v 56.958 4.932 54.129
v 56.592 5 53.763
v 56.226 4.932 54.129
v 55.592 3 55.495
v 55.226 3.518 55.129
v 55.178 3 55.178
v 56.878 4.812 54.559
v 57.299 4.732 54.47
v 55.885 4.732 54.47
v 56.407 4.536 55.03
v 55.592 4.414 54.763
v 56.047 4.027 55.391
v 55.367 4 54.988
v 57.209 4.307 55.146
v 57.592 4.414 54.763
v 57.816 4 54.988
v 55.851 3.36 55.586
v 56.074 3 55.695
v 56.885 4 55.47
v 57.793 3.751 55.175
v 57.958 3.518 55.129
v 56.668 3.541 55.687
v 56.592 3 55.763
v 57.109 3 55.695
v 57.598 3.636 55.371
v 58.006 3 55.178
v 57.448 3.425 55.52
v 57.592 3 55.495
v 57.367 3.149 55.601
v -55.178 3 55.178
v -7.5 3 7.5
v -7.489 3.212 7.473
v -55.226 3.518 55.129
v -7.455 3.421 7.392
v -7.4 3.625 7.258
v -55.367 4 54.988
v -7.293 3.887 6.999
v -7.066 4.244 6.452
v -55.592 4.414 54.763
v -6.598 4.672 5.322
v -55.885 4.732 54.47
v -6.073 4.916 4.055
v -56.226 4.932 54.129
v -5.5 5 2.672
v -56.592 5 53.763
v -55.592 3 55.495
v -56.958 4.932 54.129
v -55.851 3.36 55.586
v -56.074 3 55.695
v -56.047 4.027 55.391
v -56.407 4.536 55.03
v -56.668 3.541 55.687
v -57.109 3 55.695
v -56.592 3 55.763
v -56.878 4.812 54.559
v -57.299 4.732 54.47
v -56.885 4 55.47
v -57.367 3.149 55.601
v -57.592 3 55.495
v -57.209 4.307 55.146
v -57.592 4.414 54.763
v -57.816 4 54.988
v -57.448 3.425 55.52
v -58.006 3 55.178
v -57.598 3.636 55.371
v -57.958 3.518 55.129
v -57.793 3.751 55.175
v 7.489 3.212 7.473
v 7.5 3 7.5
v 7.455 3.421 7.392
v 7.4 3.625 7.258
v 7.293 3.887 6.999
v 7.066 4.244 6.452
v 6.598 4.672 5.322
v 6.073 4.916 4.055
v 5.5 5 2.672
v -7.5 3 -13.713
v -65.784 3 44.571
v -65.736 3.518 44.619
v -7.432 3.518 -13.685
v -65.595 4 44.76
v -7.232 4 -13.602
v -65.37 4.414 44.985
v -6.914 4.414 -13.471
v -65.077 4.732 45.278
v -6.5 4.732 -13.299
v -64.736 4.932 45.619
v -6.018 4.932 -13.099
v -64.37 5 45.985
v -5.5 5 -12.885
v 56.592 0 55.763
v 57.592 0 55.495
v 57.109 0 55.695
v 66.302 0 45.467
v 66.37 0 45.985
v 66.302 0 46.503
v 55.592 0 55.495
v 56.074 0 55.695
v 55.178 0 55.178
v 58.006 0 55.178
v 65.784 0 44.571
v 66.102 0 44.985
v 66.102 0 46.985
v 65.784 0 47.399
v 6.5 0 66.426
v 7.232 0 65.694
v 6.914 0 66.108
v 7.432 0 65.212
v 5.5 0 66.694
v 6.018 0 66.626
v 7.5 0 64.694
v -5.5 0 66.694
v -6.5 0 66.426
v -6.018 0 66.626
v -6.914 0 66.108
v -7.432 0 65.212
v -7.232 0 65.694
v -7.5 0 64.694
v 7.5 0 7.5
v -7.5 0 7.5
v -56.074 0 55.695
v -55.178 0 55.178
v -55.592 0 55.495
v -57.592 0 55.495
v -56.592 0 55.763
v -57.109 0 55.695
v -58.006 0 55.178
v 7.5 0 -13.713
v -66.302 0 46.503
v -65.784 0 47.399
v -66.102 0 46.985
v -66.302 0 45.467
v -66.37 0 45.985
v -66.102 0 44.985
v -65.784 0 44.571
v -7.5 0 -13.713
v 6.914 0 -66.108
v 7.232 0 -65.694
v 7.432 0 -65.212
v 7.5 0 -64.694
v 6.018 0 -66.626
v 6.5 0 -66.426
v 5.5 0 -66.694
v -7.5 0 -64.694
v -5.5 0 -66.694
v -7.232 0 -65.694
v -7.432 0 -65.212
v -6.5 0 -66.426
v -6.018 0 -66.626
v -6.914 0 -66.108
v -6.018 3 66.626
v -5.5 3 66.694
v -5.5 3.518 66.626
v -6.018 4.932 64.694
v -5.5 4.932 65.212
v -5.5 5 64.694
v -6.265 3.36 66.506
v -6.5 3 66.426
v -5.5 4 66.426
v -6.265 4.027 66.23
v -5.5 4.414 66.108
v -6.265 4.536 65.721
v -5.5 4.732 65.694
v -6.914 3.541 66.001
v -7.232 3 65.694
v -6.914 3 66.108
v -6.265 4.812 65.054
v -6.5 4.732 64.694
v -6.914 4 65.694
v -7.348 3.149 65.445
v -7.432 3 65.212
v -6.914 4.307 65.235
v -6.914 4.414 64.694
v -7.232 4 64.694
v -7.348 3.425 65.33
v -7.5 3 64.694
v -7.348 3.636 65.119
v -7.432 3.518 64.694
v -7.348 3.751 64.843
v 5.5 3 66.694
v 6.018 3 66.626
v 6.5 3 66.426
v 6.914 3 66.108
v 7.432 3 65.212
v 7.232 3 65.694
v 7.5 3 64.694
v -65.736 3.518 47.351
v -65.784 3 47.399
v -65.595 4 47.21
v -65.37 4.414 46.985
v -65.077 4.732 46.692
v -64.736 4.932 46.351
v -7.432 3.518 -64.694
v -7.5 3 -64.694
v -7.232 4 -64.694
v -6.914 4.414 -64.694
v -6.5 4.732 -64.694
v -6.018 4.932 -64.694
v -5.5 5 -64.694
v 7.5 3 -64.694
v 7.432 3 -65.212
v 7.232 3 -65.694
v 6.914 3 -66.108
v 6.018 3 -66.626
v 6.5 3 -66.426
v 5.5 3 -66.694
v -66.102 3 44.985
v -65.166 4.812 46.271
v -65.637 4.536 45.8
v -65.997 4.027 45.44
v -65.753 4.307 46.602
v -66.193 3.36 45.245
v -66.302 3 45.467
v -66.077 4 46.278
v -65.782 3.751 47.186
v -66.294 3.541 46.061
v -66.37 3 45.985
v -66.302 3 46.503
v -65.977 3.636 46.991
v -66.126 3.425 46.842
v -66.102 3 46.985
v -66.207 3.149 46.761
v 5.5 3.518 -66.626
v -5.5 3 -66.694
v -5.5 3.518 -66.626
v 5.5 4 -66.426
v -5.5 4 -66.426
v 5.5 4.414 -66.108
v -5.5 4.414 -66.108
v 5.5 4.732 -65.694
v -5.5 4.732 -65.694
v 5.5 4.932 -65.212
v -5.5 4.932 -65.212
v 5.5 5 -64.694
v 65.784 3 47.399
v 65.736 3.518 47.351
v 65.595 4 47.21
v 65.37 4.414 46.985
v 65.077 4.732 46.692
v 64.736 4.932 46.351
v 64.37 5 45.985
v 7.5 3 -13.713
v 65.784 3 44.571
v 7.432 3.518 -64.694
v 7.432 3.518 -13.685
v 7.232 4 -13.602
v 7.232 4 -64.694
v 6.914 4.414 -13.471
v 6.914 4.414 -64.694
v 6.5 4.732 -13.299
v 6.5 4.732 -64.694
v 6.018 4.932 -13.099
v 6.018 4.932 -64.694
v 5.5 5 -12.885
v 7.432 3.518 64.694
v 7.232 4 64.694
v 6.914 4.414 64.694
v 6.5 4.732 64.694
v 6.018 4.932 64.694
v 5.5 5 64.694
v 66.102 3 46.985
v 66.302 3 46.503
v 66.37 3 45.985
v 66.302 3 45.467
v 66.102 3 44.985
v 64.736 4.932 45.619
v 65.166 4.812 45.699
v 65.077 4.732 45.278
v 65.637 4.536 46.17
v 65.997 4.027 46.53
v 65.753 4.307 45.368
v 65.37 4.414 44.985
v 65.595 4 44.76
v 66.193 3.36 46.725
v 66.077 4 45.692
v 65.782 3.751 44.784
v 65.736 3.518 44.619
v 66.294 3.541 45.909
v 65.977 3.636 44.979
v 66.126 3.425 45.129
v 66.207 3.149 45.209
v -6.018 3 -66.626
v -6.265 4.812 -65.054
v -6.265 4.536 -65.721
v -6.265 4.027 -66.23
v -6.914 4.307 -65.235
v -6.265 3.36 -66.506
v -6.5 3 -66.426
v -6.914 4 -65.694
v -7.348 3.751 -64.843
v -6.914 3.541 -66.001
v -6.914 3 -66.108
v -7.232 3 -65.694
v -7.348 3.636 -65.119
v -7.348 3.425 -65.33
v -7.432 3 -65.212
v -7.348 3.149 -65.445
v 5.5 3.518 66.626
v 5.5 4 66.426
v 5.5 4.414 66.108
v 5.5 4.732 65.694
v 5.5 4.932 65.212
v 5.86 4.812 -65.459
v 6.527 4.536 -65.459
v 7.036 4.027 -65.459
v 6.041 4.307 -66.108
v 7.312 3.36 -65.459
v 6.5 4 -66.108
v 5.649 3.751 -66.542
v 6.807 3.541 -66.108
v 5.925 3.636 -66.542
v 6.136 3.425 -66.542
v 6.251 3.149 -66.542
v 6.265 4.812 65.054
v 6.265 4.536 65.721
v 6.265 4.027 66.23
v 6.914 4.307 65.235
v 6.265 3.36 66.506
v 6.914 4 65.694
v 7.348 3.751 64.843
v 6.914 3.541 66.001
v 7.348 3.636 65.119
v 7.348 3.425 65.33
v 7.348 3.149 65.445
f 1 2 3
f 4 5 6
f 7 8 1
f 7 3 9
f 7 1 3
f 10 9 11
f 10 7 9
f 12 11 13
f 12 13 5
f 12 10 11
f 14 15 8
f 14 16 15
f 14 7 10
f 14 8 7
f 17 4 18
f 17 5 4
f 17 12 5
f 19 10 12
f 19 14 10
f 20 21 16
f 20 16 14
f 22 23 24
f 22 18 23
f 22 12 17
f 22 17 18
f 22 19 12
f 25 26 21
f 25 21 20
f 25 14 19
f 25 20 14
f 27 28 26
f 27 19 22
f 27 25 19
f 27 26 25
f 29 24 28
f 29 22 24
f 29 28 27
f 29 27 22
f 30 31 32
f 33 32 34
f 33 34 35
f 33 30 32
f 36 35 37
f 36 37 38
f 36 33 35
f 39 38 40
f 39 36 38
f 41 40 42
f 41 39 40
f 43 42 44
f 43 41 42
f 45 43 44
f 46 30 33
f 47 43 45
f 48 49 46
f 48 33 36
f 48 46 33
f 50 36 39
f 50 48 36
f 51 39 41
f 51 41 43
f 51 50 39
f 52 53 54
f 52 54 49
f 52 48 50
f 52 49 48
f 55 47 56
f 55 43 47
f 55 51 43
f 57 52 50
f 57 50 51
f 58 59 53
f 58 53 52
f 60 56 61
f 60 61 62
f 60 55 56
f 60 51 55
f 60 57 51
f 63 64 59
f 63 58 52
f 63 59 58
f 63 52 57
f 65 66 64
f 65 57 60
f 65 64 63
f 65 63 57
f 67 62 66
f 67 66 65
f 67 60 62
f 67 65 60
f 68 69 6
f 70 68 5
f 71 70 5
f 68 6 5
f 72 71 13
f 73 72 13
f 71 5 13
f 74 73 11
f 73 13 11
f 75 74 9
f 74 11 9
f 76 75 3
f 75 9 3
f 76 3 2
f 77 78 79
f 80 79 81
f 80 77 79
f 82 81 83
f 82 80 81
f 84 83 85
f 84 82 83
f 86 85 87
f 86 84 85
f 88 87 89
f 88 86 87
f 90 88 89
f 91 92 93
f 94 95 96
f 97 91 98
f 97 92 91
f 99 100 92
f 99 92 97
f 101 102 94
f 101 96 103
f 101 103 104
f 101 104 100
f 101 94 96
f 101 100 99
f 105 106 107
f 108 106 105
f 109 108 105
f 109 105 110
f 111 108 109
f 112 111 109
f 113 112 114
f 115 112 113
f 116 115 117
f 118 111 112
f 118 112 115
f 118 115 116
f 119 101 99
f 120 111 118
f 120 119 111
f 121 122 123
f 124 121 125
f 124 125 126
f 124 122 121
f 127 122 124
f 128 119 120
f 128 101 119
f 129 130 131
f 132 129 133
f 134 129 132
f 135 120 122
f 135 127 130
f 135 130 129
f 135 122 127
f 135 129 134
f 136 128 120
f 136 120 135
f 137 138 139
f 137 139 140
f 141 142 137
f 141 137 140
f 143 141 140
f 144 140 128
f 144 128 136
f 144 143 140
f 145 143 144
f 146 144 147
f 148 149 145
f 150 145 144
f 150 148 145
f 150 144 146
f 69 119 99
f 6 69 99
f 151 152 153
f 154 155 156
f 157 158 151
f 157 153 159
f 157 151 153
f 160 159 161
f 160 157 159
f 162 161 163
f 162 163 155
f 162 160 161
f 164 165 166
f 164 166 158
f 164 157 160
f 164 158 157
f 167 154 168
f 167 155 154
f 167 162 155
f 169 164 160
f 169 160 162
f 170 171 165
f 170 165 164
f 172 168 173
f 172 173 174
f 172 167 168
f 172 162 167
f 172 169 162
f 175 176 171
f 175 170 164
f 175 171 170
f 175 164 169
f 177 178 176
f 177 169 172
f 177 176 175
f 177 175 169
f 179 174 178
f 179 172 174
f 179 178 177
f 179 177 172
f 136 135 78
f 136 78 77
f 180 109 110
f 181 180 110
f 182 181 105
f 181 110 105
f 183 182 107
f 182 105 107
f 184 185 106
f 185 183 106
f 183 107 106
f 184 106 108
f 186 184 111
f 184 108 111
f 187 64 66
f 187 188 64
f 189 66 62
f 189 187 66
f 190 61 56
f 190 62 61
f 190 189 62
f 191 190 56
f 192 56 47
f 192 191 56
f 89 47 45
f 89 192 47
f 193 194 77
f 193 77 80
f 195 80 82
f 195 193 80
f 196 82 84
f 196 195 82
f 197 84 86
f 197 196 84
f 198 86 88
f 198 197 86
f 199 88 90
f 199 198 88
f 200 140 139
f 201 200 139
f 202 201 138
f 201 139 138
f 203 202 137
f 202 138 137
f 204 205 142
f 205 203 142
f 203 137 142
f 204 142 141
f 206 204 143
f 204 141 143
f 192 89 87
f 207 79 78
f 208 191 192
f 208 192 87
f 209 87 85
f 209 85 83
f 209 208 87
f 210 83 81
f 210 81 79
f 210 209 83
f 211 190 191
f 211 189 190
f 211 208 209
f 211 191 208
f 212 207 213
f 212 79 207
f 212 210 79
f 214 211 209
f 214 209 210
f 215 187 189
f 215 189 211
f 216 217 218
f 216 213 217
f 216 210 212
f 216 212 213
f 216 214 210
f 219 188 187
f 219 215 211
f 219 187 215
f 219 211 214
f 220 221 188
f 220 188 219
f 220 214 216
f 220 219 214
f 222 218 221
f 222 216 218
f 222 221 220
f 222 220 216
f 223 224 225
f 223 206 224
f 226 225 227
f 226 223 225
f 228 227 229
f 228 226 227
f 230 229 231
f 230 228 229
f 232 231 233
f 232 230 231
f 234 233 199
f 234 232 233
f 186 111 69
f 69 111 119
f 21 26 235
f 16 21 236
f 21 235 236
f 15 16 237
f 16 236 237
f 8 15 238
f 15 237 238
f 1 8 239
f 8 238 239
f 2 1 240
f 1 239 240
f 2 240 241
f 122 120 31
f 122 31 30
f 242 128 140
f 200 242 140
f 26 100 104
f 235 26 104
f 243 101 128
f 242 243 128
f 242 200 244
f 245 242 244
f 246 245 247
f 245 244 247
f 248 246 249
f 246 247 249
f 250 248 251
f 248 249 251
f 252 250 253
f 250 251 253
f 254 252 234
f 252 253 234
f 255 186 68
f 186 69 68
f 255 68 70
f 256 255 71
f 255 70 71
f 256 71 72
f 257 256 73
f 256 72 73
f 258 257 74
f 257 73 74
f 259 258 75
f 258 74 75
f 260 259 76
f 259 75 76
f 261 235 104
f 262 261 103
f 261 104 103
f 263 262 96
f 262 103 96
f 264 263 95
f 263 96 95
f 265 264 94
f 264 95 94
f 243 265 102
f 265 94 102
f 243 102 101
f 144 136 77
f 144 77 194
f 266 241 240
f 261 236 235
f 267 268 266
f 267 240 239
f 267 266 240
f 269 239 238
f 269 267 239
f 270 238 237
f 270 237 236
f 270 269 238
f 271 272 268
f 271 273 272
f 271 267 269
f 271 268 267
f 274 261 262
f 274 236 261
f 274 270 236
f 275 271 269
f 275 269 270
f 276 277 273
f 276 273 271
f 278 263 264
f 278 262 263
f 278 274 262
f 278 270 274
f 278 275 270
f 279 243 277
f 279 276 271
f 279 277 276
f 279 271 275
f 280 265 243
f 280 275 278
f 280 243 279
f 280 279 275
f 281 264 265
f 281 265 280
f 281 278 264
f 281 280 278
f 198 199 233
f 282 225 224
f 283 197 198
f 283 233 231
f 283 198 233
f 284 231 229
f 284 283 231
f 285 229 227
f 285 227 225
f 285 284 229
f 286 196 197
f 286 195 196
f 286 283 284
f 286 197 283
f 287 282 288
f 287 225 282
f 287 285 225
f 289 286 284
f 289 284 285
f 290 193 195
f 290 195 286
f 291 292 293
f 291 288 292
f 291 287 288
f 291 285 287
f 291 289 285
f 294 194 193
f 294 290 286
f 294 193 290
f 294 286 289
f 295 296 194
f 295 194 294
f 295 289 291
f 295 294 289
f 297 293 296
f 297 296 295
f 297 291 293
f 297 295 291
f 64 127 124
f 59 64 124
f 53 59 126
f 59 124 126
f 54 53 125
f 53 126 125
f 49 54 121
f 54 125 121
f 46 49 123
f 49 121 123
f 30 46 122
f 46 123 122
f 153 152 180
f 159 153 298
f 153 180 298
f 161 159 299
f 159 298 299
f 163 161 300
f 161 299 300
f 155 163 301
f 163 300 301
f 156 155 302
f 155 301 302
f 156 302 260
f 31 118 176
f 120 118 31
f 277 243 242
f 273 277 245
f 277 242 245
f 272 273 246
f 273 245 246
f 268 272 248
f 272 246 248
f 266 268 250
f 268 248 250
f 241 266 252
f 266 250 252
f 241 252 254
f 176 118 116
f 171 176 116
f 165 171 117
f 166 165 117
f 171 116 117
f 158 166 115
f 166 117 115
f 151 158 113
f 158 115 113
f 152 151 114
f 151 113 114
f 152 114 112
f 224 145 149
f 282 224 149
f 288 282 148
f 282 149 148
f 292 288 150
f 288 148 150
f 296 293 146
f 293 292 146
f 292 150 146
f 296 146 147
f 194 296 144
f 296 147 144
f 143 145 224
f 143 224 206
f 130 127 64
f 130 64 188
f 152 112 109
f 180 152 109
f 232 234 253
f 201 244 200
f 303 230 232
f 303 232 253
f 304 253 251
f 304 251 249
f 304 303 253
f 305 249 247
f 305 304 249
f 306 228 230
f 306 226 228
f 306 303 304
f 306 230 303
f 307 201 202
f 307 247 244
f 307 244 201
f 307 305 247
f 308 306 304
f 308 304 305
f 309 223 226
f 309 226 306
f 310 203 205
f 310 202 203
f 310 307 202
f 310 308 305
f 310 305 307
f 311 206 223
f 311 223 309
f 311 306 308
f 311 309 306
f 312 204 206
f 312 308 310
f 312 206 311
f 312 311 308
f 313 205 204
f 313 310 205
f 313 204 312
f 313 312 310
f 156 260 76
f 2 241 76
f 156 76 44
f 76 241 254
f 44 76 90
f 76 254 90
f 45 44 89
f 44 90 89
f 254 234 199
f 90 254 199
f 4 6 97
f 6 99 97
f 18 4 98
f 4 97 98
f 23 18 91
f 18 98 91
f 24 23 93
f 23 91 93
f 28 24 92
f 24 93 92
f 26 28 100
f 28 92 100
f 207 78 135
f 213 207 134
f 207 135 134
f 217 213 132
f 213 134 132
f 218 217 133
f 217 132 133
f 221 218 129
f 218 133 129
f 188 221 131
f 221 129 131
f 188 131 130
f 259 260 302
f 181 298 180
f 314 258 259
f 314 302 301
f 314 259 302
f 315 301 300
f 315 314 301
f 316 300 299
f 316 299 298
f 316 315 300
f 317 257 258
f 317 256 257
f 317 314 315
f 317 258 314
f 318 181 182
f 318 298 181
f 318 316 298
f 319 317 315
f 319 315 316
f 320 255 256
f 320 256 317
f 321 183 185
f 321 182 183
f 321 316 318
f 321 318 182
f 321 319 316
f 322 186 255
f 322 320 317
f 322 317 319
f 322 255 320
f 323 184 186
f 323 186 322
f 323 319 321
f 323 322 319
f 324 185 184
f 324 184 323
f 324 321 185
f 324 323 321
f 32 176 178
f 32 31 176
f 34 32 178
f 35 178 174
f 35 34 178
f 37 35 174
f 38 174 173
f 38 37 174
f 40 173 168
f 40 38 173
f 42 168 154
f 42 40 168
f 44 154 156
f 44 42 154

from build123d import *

# Parameters (mm, degrees)
SKETCH1_W           = 15
SKETCH1_H           = 133.387974866
BOSS_EXTRUDE4_DEPTH = 5
FILLET2_R           = 2
FILLET3_R           = 2


with BuildPart() as part:
    # Sketch1 → Boss-Extrude4 (new body)
    with BuildSketch(Plane(origin=(0, 0, 0), x_dir=(1, 0, 0), z_dir=(0, 1, 0))):
        Polygon((-56.591724934, -56.591724934), (-67.198326652, -45.985123216), (-4.122226718, 17.090976718), (6.484375, 6.484375), align=None)
        Rectangle(SKETCH1_W, SKETCH1_H)
        Polygon((56.591724934, -56.591724934), (67.198326652, -45.985123216), (3.579374214, 17.633829222), (-7.027227504, 7.027227504), align=None)
    extrude(amount=BOSS_EXTRUDE4_DEPTH)

    # Fillet2
    fillet2_edges = [part.edges().sort_by_distance(p)[0] for p in [
        (32.045862467, 5, 32.045862467),
        (-32.045862467, 5, 32.045862467),
        (-61.895025793, 5, 51.288424075),
        (-37.349163326, 5, 16.13595989),
        (-7.5, 5, 37.096993717),
        (-7.5, 5, -40.203595434),
        (0, 5, 66.693987433),
        (7.5, 5, 37.096993717),
        (7.5, 5, -40.203595434),
        (0, 5, -66.693987433),
        (61.895025793, 5, 51.288424075),
        (37.349163326, 5, 16.13595989),
    ]]
    fillet(fillet2_edges, radius=FILLET2_R)

    # Fillet3
    # the kernel refuses this fillet: 2 mm, written as the material it takes off along each edge
    with BuildSketch(Plane(origin=(-5.5, 3, 64.693987433), x_dir=(0, 0, 1), z_dir=(-1, 0, 0))) as fillet3_piece_1_section:
        Polygon((0, 0), (FILLET3_R, 0), (FILLET3_R, FILLET3_R), (0, FILLET3_R), align=None)
    fillet3_piece_1 = extrude(amount=FILLET3_R, mode=Mode.PRIVATE)
    fillet3_piece_1 = fillet3_piece_1 - Plane(origin=(-5.5, 3, 64.693987433), x_dir=(0, -0.7071067811865475, -0.7071067811865475), z_dir=(-1, 0, 0)) * Sphere(FILLET3_R, mode=Mode.PRIVATE)
    add(fillet3_piece_1, mode=Mode.SUBTRACT)
    with BuildSketch(Plane(origin=(5.5, 3, 64.693987433), x_dir=(0, 0, 1), z_dir=(1, 0, 0))) as fillet3_piece_2_section:
        Polygon((0, 0), (FILLET3_R, 0), (FILLET3_R, -FILLET3_R), (0, -FILLET3_R), align=None)
    fillet3_piece_2 = extrude(amount=FILLET3_R, mode=Mode.PRIVATE)
    fillet3_piece_2 = fillet3_piece_2 - Plane(origin=(5.5, 3, 64.693987433), x_dir=(0, -0.7071067811865475, -0.7071067811865475), z_dir=(1, 0, 0)) * Sphere(FILLET3_R, mode=Mode.PRIVATE)
    add(fillet3_piece_2, mode=Mode.SUBTRACT)
    with BuildSketch(Plane(origin=(-56.591724934, 3, 53.763297809), x_dir=(0.7071067811865437, 0, 0.7071067811865513), z_dir=(-0.7071067811865476, 0, 0.7071067811865476))) as fillet3_piece_3_section:
        Polygon((0, 0), (FILLET3_R, 0), (FILLET3_R, FILLET3_R), (0, FILLET3_R), align=None)
    fillet3_piece_3 = extrude(amount=FILLET3_R, mode=Mode.PRIVATE)
    fillet3_piece_3 = fillet3_piece_3 - Plane(origin=(-56.591724934, 3, 53.763297809), x_dir=(-0.4999999999999973, -0.7071067811865475, -0.5000000000000027), z_dir=(-0.7071067811865476, 0, 0.7071067811865476)) * Sphere(FILLET3_R, mode=Mode.PRIVATE)
    add(fillet3_piece_3, mode=Mode.SUBTRACT)
    with BuildSketch(Plane(origin=(56.591724934, 3, 53.763297809), x_dir=(-0.7071067811865476, 0, 0.7071067811865476), z_dir=(0.7071067811865479, 0, 0.7071067811865474))) as fillet3_piece_4_section:
        Polygon((0, 0), (FILLET3_R, 0), (FILLET3_R, -FILLET3_R), (0, -FILLET3_R), align=None)
    fillet3_piece_4 = extrude(amount=FILLET3_R, mode=Mode.PRIVATE)
    fillet3_piece_4 = fillet3_piece_4 - Plane(origin=(56.591724934, 3, 53.763297809), x_dir=(0.5, -0.7071067811865475, -0.5), z_dir=(0.7071067811865479, 0, 0.7071067811865474)) * Sphere(FILLET3_R, mode=Mode.PRIVATE)
    add(fillet3_piece_4, mode=Mode.SUBTRACT)
    with BuildSketch(Plane(origin=(-64.369899527, 3, 45.985123216), x_dir=(-0.7071067811865476, 0, -0.7071067811865476), z_dir=(-0.7071067811865476, 0, 0.7071067811865476))) as fillet3_piece_5_section:
        Polygon((0, 0), (FILLET3_R, 0), (FILLET3_R, -FILLET3_R), (0, -FILLET3_R), align=None)
    fillet3_piece_5 = extrude(amount=FILLET3_R, mode=Mode.PRIVATE)
    fillet3_piece_5 = fillet3_piece_5 - Plane(origin=(-64.369899527, 3, 45.985123216), x_dir=(0.5, -0.7071067811865475, 0.5), z_dir=(-0.7071067811865476, 0, 0.7071067811865476)) * Sphere(FILLET3_R, mode=Mode.PRIVATE)
    add(fillet3_piece_5, mode=Mode.SUBTRACT)
    with BuildSketch(Plane(origin=(64.369899527, 3, 45.985123216), x_dir=(0.7071067811865479, 0, 0.7071067811865474), z_dir=(0.7071067811865474, 0, -0.7071067811865478))) as fillet3_piece_6_section:
        Polygon((0, 0), (FILLET3_R, 0), (FILLET3_R, -FILLET3_R), (0, -FILLET3_R), align=None)
    fillet3_piece_6 = extrude(amount=FILLET3_R, mode=Mode.PRIVATE)
    fillet3_piece_6 = fillet3_piece_6 - Plane(origin=(64.369899527, 3, 45.985123216), x_dir=(-0.5000000000000002, -0.7071067811865475, -0.49999999999999983), z_dir=(0.7071067811865474, 0, -0.7071067811865478)) * Sphere(FILLET3_R, mode=Mode.PRIVATE)
    add(fillet3_piece_6, mode=Mode.SUBTRACT)
    with BuildSketch(Plane(origin=(-5.5, 3, -64.693987433), x_dir=(0, 0, -1), z_dir=(-1, 0, 0))) as fillet3_piece_7_section:
        Polygon((0, 0), (FILLET3_R, 0), (FILLET3_R, -FILLET3_R), (0, -FILLET3_R), align=None)
    fillet3_piece_7 = extrude(amount=FILLET3_R, mode=Mode.PRIVATE)
    fillet3_piece_7 = fillet3_piece_7 - Plane(origin=(-5.5, 3, -64.693987433), x_dir=(0, -0.7071067811865475, 0.7071067811865475), z_dir=(-1, 0, 0)) * Sphere(FILLET3_R, mode=Mode.PRIVATE)
    add(fillet3_piece_7, mode=Mode.SUBTRACT)
    with BuildSketch(Plane(origin=(5.5, 3, -64.693987433), x_dir=(1, 0, 0), z_dir=(0, 0, -1))) as fillet3_piece_8_section:
        Polygon((0, 0), (FILLET3_R, 0), (FILLET3_R, -FILLET3_R), (0, -FILLET3_R), align=None)
    fillet3_piece_8 = extrude(amount=FILLET3_R, mode=Mode.PRIVATE)
    fillet3_piece_8 = fillet3_piece_8 - Plane(origin=(5.5, 3, -64.693987433), x_dir=(-0.7071067811865475, -0.7071067811865475, 0), z_dir=(0, 0, -1)) * Sphere(FILLET3_R, mode=Mode.PRIVATE)
    add(fillet3_piece_8, mode=Mode.SUBTRACT)
    with BuildSketch(Plane(origin=(-7.5, -5, -66.693987433), x_dir=(0, 0, 1), z_dir=(0, 1, 0)), Plane(origin=(7.5, -5, -66.693987433), x_dir=(-1, 0, 0), z_dir=(0, 1, 0)), Plane(origin=(67.198326652, -5, 45.985123216), x_dir=(-0.7071067811865476, 0, -0.7071067811865476), z_dir=(0, 1, 0)), Plane(origin=(56.591724934, -5, 56.591724934), x_dir=(0.7071067811865476, 0, -0.7071067811865476), z_dir=(0, 1, 0)), Plane(origin=(7.5, -5, 66.693987433), x_dir=(0, 0, -1), z_dir=(0, 1, 0)), Plane(origin=(-67.198326652, -5, 45.985123216), x_dir=(0.7071067811865476, 0, 0.7071067811865476), z_dir=(0, 1, 0))) as fillet3_piece_9:
        with BuildLine():
            CenterArc((FILLET3_R, FILLET3_R), FILLET3_R, 180, 90)
            Line((0, FILLET3_R), (0, 0))
            Line((0, 0), (FILLET3_R, 0))
        make_face()
    extrude(amount=8, mode=Mode.SUBTRACT)
    with BuildSketch(Plane(origin=(-7.5, -5, 66.693987433), x_dir=(0, 0, -1), z_dir=(0, 1, 0)), Plane(origin=(-56.591724934, -5, 56.591724934), x_dir=(-0.7071067811865476, 0, -0.7071067811865476), z_dir=(0, 1, 0))) as fillet3_piece_10:
        with BuildLine():
            CenterArc((FILLET3_R, -FILLET3_R), FILLET3_R, 90, 90)
            Line((0, -FILLET3_R), (0, 0))
            Line((0, 0), (FILLET3_R, 0))
        make_face()
    extrude(amount=8, mode=Mode.SUBTRACT)


solid = part.part
